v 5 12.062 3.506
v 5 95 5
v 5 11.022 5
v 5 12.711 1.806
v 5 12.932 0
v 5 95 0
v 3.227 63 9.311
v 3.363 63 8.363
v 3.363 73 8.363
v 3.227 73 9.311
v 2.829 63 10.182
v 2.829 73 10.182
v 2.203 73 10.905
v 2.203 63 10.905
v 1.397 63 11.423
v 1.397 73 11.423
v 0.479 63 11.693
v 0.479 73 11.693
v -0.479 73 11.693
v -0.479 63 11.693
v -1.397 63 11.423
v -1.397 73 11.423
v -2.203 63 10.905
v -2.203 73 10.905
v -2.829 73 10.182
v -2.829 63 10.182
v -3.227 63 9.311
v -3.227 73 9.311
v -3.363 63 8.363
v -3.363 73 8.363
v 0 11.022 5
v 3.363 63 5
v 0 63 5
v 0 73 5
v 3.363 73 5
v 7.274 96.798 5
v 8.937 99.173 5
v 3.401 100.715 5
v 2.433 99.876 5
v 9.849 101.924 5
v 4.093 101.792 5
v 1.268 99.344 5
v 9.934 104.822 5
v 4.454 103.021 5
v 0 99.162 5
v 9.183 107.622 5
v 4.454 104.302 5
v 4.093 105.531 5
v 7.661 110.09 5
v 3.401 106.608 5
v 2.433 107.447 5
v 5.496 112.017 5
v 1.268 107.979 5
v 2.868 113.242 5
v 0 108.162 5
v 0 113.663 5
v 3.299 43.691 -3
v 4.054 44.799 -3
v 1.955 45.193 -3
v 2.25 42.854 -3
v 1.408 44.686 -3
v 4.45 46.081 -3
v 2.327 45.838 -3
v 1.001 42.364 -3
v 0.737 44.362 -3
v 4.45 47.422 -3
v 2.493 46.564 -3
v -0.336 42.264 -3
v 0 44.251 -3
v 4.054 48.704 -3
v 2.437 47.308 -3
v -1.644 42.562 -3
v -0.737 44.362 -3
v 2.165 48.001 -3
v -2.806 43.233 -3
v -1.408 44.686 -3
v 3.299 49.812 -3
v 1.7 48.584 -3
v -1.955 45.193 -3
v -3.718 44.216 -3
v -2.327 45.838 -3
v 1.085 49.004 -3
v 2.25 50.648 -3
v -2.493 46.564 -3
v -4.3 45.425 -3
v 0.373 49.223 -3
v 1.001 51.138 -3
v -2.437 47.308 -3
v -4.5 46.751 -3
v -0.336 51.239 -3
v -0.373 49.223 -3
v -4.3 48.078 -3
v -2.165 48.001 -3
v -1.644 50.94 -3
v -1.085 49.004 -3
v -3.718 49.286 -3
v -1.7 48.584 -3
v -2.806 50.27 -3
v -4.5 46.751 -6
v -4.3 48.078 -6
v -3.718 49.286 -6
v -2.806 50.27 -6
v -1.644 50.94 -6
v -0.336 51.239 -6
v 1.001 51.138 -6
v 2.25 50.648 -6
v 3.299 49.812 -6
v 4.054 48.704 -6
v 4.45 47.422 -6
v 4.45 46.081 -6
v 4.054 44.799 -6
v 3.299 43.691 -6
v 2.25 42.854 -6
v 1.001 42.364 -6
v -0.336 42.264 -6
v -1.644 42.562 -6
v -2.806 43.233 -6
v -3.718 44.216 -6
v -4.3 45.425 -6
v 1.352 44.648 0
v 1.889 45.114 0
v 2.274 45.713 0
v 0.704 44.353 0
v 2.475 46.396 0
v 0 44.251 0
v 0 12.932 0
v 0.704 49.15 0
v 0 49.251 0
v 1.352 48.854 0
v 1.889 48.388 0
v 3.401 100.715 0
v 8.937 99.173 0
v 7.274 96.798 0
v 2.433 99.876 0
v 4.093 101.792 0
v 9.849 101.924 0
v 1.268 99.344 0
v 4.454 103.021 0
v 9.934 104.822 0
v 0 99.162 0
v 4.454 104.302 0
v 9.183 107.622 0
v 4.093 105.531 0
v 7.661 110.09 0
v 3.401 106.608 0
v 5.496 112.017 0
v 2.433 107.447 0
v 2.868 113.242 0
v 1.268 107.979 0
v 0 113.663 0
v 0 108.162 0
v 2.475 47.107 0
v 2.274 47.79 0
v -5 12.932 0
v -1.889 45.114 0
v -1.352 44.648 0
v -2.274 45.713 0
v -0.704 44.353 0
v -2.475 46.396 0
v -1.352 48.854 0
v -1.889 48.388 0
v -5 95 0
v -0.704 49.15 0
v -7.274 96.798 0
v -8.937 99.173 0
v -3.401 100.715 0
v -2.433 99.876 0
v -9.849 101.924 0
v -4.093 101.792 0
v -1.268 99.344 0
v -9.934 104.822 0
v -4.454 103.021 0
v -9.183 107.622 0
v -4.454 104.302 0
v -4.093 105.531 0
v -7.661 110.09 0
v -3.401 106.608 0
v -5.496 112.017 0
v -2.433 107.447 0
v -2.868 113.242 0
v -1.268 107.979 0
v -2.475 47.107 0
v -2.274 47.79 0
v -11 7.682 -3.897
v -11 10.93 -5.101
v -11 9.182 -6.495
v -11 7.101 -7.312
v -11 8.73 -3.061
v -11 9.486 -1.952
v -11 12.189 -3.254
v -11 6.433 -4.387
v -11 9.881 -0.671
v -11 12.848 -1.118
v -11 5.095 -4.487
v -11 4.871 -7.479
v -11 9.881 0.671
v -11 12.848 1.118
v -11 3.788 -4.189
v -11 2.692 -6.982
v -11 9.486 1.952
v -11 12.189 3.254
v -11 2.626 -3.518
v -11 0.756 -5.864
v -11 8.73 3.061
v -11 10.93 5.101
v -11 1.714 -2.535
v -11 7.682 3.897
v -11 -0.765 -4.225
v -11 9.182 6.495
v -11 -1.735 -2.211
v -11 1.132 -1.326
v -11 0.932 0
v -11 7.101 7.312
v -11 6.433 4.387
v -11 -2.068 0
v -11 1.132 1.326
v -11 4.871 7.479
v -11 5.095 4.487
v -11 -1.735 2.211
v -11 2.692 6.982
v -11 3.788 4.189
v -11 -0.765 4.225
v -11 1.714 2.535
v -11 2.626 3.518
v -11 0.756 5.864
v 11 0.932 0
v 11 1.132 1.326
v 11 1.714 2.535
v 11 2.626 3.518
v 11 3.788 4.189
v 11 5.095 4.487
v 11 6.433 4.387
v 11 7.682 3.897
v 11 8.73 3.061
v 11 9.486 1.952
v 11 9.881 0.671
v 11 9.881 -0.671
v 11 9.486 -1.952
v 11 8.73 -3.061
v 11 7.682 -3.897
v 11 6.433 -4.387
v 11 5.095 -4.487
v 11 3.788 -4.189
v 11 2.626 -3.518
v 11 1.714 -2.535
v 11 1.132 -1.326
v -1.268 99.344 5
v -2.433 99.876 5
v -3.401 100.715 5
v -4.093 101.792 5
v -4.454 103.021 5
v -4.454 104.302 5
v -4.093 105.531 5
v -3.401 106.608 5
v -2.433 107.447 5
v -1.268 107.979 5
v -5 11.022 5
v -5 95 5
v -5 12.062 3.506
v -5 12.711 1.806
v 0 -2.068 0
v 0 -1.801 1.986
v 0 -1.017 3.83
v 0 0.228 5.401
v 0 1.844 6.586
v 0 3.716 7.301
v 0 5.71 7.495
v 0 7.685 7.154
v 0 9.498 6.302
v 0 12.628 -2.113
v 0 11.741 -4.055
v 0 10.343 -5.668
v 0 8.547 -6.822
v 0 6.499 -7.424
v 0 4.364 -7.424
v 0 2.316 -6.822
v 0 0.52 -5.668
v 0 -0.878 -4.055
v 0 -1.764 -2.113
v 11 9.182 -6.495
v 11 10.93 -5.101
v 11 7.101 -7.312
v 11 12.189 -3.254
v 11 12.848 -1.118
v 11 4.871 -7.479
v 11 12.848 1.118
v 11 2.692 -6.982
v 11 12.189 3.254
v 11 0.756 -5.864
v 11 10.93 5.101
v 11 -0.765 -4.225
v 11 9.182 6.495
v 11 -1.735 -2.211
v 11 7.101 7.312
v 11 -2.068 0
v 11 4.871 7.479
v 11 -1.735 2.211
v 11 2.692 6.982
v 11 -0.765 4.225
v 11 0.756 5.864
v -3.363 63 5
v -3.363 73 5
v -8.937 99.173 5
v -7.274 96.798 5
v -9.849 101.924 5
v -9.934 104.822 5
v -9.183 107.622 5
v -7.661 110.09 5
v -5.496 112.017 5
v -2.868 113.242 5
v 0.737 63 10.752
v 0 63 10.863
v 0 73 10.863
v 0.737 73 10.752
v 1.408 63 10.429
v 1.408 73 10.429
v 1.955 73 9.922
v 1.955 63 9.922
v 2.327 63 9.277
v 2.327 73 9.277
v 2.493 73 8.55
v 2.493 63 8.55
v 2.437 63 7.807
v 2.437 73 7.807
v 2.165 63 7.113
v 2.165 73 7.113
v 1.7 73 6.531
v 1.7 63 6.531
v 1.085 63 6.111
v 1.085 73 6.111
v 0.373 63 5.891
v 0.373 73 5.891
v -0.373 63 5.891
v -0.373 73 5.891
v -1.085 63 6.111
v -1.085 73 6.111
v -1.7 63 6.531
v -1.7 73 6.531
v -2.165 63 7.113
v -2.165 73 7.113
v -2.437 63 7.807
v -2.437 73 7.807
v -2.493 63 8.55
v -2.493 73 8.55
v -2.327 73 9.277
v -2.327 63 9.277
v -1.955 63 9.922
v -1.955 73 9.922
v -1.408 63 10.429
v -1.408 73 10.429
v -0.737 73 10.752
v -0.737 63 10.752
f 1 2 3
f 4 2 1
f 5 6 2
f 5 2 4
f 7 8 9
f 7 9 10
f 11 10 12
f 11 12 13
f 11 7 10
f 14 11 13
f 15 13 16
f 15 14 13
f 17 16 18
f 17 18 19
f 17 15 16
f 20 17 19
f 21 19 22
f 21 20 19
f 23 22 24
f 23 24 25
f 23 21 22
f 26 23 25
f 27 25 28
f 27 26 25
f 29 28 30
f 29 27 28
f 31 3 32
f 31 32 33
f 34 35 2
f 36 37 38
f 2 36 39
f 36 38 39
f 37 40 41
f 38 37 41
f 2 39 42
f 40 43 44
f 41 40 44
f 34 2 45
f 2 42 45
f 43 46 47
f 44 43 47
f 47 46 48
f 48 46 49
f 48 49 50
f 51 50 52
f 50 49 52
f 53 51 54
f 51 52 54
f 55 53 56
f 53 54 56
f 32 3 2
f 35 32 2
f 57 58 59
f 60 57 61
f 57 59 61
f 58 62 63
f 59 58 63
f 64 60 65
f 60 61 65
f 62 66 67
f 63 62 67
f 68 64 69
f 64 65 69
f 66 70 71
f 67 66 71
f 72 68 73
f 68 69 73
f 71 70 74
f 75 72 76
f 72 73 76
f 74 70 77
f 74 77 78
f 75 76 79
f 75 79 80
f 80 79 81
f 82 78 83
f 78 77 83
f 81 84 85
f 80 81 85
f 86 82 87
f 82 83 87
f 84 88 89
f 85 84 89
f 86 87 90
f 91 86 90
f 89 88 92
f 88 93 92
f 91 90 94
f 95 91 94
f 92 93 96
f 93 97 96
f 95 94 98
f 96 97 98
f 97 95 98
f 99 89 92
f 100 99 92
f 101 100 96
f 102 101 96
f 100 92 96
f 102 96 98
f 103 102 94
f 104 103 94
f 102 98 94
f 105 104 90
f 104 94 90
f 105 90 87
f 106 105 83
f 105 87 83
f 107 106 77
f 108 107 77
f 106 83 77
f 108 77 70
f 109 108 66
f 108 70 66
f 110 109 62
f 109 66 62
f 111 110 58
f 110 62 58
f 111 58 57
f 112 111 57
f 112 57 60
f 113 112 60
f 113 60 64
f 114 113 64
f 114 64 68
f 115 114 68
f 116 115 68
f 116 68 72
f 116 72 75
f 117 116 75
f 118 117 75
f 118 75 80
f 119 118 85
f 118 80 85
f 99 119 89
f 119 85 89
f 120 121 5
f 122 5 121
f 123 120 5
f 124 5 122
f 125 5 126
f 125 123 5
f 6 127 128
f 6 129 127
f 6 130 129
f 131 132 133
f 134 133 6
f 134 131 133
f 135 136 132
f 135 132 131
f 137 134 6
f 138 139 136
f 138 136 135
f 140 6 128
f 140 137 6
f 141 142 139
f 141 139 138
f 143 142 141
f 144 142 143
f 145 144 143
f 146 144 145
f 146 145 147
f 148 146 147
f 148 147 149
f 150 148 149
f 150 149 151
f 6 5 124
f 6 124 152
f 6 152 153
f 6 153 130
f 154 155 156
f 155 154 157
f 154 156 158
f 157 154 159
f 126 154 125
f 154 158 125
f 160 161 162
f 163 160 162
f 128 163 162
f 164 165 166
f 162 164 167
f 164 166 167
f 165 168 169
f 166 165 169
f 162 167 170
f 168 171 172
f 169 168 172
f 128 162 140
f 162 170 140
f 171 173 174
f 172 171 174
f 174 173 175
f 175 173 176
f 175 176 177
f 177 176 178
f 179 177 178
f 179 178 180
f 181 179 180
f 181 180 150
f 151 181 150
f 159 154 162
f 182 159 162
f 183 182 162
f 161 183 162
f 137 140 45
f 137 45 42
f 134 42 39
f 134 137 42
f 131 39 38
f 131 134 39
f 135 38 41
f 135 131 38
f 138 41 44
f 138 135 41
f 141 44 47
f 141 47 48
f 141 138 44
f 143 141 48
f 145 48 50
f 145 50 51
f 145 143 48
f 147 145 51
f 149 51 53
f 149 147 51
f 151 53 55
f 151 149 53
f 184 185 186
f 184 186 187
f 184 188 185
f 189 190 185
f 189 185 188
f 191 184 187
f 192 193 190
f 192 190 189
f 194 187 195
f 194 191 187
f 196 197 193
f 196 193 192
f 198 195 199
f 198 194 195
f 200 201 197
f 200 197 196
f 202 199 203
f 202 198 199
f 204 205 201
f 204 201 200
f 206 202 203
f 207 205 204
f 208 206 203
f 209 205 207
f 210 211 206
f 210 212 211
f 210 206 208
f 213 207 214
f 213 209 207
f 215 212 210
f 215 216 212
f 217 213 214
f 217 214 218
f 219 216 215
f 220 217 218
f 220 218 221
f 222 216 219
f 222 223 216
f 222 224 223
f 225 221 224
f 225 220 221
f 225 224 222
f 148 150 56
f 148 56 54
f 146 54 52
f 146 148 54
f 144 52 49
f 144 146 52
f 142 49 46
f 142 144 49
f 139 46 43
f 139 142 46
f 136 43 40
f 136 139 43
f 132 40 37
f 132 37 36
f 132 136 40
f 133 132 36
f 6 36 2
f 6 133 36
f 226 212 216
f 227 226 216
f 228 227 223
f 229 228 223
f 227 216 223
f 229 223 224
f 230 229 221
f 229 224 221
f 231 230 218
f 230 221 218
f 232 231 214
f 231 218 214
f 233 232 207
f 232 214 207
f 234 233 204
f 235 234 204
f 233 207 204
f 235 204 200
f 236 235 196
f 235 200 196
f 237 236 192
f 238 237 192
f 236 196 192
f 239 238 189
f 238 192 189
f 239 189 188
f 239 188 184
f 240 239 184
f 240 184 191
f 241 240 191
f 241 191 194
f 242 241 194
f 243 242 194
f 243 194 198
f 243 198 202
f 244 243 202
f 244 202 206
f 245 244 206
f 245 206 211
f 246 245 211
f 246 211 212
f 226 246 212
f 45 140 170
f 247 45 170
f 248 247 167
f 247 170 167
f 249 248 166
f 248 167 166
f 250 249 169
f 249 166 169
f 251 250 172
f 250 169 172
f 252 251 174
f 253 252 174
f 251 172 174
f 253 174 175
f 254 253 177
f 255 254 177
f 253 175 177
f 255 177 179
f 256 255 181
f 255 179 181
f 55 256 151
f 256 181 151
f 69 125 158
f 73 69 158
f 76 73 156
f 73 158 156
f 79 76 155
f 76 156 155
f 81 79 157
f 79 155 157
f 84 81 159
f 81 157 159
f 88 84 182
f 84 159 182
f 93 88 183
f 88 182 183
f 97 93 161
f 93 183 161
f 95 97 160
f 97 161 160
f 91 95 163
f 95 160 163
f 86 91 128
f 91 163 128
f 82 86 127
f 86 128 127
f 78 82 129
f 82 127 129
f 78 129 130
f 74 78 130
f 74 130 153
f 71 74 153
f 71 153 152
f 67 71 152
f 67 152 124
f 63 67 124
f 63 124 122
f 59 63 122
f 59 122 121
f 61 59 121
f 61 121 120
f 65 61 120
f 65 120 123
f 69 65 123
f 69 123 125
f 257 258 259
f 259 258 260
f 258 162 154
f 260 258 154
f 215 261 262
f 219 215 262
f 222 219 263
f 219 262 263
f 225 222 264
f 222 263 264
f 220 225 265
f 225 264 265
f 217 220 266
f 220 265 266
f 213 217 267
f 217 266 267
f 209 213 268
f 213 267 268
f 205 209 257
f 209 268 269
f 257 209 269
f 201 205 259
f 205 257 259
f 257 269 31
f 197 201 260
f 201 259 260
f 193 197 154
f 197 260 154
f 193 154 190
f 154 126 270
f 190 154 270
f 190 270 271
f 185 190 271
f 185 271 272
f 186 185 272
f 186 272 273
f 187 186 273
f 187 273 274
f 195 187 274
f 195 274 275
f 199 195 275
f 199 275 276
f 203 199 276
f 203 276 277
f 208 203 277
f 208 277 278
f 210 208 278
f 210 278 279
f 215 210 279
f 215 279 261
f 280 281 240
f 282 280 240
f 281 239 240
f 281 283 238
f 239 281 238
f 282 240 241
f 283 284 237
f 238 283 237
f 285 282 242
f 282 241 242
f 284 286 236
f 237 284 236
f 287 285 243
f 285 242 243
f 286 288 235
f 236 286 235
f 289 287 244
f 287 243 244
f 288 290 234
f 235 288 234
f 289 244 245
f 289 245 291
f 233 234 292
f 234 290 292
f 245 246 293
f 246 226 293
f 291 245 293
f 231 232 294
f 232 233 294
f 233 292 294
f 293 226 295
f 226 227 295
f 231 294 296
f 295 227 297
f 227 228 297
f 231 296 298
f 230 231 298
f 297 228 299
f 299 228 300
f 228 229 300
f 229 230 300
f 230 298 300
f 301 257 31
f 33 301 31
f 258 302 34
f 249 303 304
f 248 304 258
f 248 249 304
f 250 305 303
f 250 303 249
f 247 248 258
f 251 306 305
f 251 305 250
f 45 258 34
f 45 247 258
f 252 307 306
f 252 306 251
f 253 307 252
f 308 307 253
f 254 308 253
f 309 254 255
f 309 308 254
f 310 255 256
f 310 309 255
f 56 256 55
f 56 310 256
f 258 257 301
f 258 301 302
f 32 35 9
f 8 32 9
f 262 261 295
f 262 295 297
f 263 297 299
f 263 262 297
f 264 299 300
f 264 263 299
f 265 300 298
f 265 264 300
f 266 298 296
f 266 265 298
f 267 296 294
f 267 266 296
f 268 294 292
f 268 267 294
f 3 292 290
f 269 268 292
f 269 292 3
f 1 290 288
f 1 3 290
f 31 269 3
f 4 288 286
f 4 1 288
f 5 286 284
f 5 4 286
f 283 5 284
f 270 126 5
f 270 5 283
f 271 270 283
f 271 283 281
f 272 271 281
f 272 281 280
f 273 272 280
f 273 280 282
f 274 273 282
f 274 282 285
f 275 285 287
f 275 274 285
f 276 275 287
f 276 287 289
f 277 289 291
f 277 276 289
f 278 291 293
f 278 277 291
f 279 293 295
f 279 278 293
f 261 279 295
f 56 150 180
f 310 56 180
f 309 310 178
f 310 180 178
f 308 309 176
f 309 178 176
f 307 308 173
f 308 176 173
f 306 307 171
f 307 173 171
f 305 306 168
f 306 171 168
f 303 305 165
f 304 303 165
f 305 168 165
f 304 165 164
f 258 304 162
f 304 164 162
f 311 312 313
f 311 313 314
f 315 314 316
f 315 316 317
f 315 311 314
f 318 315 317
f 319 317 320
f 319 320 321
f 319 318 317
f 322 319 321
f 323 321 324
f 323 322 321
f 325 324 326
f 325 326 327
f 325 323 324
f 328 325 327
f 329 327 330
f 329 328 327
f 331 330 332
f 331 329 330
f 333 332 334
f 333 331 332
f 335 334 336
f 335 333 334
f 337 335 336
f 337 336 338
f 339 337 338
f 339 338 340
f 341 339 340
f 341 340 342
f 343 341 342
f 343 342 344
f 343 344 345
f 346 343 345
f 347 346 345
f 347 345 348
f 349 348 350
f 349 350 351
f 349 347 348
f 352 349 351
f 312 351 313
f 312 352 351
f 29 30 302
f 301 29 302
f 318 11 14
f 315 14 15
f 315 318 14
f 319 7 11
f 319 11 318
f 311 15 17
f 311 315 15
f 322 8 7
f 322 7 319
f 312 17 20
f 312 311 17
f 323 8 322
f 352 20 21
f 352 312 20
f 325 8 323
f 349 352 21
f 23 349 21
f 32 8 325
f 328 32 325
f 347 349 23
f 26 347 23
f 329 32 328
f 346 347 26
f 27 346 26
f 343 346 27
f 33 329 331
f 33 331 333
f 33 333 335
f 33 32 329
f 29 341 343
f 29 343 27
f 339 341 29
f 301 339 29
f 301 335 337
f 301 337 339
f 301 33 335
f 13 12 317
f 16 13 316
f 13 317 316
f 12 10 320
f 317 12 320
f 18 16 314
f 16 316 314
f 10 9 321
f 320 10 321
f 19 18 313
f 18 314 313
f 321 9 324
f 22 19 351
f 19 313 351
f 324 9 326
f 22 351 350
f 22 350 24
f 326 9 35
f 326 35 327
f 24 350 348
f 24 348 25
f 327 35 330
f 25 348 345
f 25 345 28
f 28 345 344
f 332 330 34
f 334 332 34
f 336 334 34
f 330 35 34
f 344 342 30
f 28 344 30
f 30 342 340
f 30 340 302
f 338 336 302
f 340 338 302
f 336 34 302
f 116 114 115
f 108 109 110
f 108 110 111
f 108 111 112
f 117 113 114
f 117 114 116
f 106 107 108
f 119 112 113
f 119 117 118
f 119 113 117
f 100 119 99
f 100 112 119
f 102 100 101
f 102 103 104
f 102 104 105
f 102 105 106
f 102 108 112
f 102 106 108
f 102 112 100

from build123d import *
from build123d.topology import SkipClean

# Parameters (mm, degrees)
BOSS_EXTRUDE1_DEPTH      = 5
BOSS_EXTRUDE2_START      = -5
SKETCH3_R                = 7.5
BOSS_EXTRUDE2_DEPTH      = 11
SKETCH7_R                = 2.5
BOSS_EXTRUDE7_DEPTH      = 3
SKETCH8_R                = 4.5
BOSS_EXTRUDE8_DEPTH      = 3
BOSS_EXTRUDE9_DEPTH      = 8
BOSS_EXTRUDE9_DEPTH_BACK = 2
BOSS_EXTRUDE9_START      = 65
SKETCH9_R                = 2.5
SKETCH4_R                = 4.5
CUT_EXTRUDE1_DEPTH       = 117.364534493


with BuildPart() as part:
    # Sketch1 → Boss-Extrude1 (new body)
    with BuildSketch(Plane.XY):
        with BuildLine():
            Line((-5, 95), (-5, 0))
            Line((-5, 0), (0, 0))
            Line((0, 0), (0, 99.161508865))
            ThreePointArc((0, 99.161508865), (-4.5, 103.661508865), (0, 108.161508865))
            Line((0, 108.161508865), (0, 113.662595596))
            ThreePointArc((0, 113.662595596), (-9.660389154, 106.249677564), (-5, 95))
        make_face()
    boss_extrude1 = extrude(amount=BOSS_EXTRUDE1_DEPTH)

    # Sketch3 → Boss-Extrude2 (add)
    with BuildSketch(Plane.ZY.offset(5).offset(BOSS_EXTRUDE2_START)):
        with Locations(Location((0, 5.43173798, 0), (0, 0, 270))):
            Circle(SKETCH3_R)
    boss_extrude2 = extrude(amount=BOSS_EXTRUDE2_DEPTH)

    # Sketch7 → Boss-Extrude7 (add)
    with BuildSketch(Plane(origin=(0, 0, 0), x_dir=(-1, 0, 0), z_dir=(0, 0, -1))):
        with Locations(Location((0, 46.751317941, 0), (0, 0, 270))):
            Circle(SKETCH7_R)
    extrude(amount=BOSS_EXTRUDE7_DEPTH)

    # Sketch8 → Boss-Extrude8 (add)
    with BuildSketch(Plane(origin=(0, 0, -3), x_dir=(-1, 0, 0), z_dir=(0, 0, -1))):
        with Locations((0, 46.751317941)):
            Circle(SKETCH8_R)
    extrude(amount=BOSS_EXTRUDE8_DEPTH)

    # Sketch9 → Boss-Extrude9 (add, two sides: drawn at the far end of the back side and taken through both)
    with BuildSketch(Plane(origin=(0, 0, 0), x_dir=(1, 0, 0), z_dir=(0, 1, 0)).offset(BOSS_EXTRUDE9_START - BOSS_EXTRUDE9_DEPTH_BACK)):
        with BuildLine():
            Line((-3.3634301, -8.3634301), (-3.3634301, -5))
            Line((-3.3634301, -5), (3.3634301, -5))
            Line((3.3634301, -5), (3.3634301, -8.3634301))
            ThreePointArc((3.3634301, -8.3634301), (0, -11.726860201), (-3.3634301, -8.3634301))
        make_face()
        with Locations(Location((0, -8.3634301, 0), (0, 0, 270))):
            Circle(SKETCH9_R, mode=Mode.SUBTRACT)
    extrude(amount=BOSS_EXTRUDE9_DEPTH + BOSS_EXTRUDE9_DEPTH_BACK)

    # Mirror1: Boss-Extrude1, Boss-Extrude2 across plane
    with SkipClean():  # the faces are left unmerged after this step: merging them gives an invalid solid
        add(boss_extrude1.mirror(Plane(origin=(0, 0, 5), x_dir=(0, 0, 1), z_dir=(-1, 0, 0))))
        add(boss_extrude2.mirror(Plane(origin=(0, 0, 5), x_dir=(0, 0, 1), z_dir=(-1, 0, 0))))

    # Sketch4 → Cut-Extrude1 (cut, through all)
    with SkipClean():  # the faces are left unmerged after this step: merging them gives an invalid solid
        with BuildSketch(Plane.ZY.offset(11)):
            with Locations(Location((0, 5.43173798, 0), (0, 0, 270))):
                Circle(SKETCH4_R)
        extrude(amount=-CUT_EXTRUDE1_DEPTH, mode=Mode.SUBTRACT)


solid = part.part
